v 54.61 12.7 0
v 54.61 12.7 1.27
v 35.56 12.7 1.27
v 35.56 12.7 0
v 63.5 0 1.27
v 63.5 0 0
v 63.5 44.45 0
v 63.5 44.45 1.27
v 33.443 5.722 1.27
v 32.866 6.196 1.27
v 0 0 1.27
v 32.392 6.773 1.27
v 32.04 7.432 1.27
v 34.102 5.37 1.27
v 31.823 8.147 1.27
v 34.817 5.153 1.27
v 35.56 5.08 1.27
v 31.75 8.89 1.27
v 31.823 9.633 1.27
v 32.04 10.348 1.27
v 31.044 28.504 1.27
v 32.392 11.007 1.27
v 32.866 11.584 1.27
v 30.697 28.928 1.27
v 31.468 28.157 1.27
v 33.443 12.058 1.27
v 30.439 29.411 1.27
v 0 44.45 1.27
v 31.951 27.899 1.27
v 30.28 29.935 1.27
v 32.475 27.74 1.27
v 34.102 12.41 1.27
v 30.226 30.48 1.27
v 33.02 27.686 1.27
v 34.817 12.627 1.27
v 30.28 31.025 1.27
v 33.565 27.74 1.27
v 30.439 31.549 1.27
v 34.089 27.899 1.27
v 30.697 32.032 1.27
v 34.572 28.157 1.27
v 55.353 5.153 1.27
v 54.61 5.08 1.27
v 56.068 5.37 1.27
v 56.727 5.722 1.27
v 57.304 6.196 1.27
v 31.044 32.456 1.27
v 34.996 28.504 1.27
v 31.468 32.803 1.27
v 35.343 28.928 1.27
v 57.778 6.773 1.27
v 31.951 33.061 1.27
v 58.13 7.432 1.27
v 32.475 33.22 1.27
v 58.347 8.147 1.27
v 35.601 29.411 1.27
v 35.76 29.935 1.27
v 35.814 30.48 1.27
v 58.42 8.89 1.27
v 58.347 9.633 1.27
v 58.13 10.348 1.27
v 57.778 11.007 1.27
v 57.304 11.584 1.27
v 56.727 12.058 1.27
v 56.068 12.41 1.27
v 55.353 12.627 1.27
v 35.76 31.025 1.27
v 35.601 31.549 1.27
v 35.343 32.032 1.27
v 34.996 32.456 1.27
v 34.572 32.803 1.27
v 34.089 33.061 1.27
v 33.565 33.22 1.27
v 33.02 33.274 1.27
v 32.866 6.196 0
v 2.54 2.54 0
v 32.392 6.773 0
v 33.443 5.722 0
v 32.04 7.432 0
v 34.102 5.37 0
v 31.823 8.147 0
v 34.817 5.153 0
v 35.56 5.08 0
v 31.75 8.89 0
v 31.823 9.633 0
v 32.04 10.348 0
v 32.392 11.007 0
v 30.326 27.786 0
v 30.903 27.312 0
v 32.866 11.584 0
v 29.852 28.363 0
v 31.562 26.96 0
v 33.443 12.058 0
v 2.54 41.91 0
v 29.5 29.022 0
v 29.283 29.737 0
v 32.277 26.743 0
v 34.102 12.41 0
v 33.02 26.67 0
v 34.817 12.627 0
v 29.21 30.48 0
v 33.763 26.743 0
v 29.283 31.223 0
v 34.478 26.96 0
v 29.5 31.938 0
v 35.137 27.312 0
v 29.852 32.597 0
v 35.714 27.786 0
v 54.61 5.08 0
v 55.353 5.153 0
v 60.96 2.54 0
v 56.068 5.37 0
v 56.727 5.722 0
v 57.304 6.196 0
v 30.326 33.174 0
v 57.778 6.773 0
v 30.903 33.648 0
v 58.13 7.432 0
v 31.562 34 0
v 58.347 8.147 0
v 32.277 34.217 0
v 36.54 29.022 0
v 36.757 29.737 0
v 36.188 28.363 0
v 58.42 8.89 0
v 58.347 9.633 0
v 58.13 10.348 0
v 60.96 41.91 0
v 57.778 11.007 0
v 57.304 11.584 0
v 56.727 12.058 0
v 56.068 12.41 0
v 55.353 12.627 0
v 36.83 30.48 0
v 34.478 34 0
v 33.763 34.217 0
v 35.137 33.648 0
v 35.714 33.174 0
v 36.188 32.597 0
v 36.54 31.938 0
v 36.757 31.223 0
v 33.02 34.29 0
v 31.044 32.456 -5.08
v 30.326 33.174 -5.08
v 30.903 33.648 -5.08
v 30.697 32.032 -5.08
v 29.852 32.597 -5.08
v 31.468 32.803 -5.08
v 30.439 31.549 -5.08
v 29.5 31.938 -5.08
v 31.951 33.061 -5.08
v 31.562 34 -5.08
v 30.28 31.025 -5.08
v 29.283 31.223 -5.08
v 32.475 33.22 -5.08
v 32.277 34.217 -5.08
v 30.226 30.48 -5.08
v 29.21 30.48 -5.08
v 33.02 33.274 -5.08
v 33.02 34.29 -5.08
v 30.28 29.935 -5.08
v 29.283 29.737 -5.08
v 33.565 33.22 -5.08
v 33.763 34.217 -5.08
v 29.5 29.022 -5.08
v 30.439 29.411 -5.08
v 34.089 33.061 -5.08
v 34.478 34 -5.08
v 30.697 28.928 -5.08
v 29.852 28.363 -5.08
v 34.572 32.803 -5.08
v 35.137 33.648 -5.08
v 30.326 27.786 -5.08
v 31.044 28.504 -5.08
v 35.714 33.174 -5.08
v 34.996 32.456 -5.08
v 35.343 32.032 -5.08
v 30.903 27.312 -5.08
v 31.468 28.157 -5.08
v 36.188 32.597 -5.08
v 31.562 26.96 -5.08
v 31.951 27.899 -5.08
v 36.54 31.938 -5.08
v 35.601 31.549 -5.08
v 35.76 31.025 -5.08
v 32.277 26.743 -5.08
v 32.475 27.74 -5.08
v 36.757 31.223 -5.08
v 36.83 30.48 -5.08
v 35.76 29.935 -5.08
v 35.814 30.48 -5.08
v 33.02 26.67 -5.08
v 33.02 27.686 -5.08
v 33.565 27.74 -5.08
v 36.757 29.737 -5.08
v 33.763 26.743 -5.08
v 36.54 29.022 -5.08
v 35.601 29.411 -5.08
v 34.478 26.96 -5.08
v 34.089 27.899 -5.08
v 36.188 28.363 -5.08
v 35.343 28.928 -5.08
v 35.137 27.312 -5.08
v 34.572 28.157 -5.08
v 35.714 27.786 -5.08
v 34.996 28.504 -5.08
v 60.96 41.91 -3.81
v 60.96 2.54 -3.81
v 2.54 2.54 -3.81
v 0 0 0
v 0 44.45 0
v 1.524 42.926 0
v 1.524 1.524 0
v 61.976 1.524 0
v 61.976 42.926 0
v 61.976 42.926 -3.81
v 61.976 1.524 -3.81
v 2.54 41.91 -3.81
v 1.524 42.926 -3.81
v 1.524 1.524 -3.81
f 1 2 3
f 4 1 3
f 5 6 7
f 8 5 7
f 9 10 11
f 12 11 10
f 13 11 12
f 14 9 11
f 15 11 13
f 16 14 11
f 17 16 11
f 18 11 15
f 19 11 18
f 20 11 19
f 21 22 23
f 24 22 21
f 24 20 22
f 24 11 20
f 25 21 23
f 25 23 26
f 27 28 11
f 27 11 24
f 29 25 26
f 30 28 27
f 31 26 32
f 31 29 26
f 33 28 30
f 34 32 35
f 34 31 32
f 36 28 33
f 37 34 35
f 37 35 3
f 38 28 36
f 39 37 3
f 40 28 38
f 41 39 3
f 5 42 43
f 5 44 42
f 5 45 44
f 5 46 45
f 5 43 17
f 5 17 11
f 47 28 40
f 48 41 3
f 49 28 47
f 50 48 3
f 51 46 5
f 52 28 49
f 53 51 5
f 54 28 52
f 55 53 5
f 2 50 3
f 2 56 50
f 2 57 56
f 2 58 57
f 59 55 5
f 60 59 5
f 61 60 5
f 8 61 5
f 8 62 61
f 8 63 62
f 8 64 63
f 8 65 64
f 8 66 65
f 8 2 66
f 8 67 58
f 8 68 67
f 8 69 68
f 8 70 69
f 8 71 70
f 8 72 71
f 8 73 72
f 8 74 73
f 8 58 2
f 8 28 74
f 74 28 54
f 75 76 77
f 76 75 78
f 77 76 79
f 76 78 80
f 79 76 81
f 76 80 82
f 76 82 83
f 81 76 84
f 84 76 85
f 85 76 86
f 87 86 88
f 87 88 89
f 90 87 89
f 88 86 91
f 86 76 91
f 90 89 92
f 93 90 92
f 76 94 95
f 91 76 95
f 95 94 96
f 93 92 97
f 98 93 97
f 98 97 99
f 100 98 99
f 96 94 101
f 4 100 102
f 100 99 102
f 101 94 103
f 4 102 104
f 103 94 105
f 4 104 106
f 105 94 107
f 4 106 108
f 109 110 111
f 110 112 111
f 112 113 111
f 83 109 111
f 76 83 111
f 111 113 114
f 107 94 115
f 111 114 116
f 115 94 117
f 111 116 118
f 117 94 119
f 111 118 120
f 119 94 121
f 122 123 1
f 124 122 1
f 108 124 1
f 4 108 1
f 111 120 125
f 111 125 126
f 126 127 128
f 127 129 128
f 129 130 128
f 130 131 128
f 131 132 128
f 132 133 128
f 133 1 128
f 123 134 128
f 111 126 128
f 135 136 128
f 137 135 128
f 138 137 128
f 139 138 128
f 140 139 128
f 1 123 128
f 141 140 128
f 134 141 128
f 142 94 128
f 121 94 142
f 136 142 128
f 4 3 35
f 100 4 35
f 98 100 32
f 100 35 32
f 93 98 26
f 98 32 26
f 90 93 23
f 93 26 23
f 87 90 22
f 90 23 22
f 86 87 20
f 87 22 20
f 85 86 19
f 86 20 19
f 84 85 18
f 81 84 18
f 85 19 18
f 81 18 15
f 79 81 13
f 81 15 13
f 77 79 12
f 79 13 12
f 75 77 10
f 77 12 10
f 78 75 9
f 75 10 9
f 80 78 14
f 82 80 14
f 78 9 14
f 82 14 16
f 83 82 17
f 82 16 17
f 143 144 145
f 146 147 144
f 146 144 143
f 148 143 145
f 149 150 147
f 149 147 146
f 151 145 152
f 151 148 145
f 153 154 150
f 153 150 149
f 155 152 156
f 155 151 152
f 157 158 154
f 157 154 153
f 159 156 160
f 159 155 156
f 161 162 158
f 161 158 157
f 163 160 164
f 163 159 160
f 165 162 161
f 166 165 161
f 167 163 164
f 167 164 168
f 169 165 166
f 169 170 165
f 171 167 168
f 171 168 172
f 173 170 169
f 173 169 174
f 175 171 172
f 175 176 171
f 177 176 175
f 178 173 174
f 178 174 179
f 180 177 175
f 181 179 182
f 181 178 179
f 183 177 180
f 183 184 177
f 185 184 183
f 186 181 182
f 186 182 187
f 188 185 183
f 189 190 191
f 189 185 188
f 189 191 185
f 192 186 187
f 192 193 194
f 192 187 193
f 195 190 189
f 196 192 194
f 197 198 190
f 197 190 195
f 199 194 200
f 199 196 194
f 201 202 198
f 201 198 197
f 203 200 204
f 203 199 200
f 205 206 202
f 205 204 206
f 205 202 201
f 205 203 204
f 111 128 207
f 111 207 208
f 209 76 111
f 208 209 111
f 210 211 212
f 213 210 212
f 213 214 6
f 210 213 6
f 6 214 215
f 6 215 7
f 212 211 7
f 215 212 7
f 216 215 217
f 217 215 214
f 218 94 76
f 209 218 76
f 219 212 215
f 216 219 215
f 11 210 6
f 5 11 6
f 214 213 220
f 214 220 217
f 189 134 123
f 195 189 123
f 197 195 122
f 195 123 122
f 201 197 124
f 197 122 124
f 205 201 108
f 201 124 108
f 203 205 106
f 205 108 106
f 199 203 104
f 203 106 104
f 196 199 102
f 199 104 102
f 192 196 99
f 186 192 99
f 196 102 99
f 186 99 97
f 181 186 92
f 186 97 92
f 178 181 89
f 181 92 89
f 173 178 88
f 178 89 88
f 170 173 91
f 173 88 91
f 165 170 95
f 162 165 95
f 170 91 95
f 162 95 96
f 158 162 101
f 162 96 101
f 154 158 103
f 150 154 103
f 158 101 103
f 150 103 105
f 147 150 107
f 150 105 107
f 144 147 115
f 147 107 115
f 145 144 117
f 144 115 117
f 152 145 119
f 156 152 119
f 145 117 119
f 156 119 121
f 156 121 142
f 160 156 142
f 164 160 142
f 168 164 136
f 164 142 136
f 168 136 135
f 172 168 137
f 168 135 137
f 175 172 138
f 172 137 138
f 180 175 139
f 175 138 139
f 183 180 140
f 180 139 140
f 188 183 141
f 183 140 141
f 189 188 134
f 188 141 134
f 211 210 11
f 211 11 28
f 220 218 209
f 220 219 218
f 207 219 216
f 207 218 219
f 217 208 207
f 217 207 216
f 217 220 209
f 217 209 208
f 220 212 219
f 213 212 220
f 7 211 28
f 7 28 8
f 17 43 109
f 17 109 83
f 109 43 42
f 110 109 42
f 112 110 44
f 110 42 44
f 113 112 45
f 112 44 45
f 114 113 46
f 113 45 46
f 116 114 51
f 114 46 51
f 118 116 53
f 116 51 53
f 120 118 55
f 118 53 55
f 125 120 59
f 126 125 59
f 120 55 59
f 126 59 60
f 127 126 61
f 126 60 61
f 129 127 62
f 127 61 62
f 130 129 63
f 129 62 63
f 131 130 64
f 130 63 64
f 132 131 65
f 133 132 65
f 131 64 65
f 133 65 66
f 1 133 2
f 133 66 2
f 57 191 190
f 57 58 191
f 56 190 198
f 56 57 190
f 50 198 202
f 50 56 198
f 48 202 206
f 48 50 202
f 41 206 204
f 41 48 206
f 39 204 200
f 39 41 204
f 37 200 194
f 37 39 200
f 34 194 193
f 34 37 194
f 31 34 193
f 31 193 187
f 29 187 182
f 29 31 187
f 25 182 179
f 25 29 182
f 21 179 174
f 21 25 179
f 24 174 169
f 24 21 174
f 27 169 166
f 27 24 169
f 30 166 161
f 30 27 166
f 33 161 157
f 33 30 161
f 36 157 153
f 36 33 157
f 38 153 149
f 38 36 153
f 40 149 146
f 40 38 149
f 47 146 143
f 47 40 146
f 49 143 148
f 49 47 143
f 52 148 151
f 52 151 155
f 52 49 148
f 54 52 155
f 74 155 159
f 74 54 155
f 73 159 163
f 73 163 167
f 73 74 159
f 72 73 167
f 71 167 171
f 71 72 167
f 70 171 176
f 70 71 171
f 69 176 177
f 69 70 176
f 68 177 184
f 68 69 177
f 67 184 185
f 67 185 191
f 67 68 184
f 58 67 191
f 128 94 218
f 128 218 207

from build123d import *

# Parameters (mm, degrees)
SKETCH_W      = 63.5
SKETCH_H      = 44.45
PAD_DEPTH     = 1.27
SKETCH001_W   = 60.452
SKETCH001_H   = 41.402
SKETCH001_W_2 = 58.42
SKETCH001_H_2 = 39.37
PAD001_DEPTH  = 3.81
SKETCH002_R   = 2.794
POCKET_DEPTH  = 5.081
SKETCH003_R   = 3.81
SKETCH003_R_2 = 2.794
PAD002_DEPTH  = 5.08


with BuildPart() as part:
    # Sketch → Pad (new body)
    with BuildSketch(Plane.XY):
        with Locations((31.75, 22.225)):
            Rectangle(SKETCH_W, SKETCH_H)
    extrude(amount=PAD_DEPTH)

    # Sketch001 (on Face5 of Pad) → Pad001 (join)
    with BuildSketch(Plane(origin=(0, 0, 0), x_dir=(1, 0, 0), z_dir=(0, 0, -1))):
        with Locations((31.75, -22.225)):
            Rectangle(SKETCH001_W, SKETCH001_H)
        with Locations((31.75, -22.225)):
            Rectangle(SKETCH001_W_2, SKETCH001_H_2, mode=Mode.SUBTRACT)
    extrude(amount=PAD001_DEPTH)

    # Sketch002 (on Face5 of Pad001) → Pocket (cut, through all)
    with BuildSketch(Plane.XY.offset(1.27)):
        with Locations((33.02, 30.48)):
            Circle(SKETCH002_R)
        with BuildLine():
            ThreePointArc((54.61, 5.08), (58.42, 8.89), (54.61, 12.7))
            Line((54.61, 12.7), (35.56, 12.7))
            ThreePointArc((35.56, 12.7), (31.75, 8.89), (35.56, 5.08))
            Line((54.61, 5.08), (35.56, 5.08))
        make_face()
    extrude(amount=-POCKET_DEPTH, mode=Mode.SUBTRACT)

    # Sketch003 (on Face17 of Pocket) → Pad002 (join)
    with BuildSketch(Plane(origin=(0, 0, 0), x_dir=(1, 0, 0), z_dir=(0, 0, -1))):
        with Locations((33.02, -30.48)):
            Circle(SKETCH003_R)
        with Locations((33.02, -30.48)):
            Circle(SKETCH003_R_2, mode=Mode.SUBTRACT)
    extrude(amount=PAD002_DEPTH)


solid = part.part
